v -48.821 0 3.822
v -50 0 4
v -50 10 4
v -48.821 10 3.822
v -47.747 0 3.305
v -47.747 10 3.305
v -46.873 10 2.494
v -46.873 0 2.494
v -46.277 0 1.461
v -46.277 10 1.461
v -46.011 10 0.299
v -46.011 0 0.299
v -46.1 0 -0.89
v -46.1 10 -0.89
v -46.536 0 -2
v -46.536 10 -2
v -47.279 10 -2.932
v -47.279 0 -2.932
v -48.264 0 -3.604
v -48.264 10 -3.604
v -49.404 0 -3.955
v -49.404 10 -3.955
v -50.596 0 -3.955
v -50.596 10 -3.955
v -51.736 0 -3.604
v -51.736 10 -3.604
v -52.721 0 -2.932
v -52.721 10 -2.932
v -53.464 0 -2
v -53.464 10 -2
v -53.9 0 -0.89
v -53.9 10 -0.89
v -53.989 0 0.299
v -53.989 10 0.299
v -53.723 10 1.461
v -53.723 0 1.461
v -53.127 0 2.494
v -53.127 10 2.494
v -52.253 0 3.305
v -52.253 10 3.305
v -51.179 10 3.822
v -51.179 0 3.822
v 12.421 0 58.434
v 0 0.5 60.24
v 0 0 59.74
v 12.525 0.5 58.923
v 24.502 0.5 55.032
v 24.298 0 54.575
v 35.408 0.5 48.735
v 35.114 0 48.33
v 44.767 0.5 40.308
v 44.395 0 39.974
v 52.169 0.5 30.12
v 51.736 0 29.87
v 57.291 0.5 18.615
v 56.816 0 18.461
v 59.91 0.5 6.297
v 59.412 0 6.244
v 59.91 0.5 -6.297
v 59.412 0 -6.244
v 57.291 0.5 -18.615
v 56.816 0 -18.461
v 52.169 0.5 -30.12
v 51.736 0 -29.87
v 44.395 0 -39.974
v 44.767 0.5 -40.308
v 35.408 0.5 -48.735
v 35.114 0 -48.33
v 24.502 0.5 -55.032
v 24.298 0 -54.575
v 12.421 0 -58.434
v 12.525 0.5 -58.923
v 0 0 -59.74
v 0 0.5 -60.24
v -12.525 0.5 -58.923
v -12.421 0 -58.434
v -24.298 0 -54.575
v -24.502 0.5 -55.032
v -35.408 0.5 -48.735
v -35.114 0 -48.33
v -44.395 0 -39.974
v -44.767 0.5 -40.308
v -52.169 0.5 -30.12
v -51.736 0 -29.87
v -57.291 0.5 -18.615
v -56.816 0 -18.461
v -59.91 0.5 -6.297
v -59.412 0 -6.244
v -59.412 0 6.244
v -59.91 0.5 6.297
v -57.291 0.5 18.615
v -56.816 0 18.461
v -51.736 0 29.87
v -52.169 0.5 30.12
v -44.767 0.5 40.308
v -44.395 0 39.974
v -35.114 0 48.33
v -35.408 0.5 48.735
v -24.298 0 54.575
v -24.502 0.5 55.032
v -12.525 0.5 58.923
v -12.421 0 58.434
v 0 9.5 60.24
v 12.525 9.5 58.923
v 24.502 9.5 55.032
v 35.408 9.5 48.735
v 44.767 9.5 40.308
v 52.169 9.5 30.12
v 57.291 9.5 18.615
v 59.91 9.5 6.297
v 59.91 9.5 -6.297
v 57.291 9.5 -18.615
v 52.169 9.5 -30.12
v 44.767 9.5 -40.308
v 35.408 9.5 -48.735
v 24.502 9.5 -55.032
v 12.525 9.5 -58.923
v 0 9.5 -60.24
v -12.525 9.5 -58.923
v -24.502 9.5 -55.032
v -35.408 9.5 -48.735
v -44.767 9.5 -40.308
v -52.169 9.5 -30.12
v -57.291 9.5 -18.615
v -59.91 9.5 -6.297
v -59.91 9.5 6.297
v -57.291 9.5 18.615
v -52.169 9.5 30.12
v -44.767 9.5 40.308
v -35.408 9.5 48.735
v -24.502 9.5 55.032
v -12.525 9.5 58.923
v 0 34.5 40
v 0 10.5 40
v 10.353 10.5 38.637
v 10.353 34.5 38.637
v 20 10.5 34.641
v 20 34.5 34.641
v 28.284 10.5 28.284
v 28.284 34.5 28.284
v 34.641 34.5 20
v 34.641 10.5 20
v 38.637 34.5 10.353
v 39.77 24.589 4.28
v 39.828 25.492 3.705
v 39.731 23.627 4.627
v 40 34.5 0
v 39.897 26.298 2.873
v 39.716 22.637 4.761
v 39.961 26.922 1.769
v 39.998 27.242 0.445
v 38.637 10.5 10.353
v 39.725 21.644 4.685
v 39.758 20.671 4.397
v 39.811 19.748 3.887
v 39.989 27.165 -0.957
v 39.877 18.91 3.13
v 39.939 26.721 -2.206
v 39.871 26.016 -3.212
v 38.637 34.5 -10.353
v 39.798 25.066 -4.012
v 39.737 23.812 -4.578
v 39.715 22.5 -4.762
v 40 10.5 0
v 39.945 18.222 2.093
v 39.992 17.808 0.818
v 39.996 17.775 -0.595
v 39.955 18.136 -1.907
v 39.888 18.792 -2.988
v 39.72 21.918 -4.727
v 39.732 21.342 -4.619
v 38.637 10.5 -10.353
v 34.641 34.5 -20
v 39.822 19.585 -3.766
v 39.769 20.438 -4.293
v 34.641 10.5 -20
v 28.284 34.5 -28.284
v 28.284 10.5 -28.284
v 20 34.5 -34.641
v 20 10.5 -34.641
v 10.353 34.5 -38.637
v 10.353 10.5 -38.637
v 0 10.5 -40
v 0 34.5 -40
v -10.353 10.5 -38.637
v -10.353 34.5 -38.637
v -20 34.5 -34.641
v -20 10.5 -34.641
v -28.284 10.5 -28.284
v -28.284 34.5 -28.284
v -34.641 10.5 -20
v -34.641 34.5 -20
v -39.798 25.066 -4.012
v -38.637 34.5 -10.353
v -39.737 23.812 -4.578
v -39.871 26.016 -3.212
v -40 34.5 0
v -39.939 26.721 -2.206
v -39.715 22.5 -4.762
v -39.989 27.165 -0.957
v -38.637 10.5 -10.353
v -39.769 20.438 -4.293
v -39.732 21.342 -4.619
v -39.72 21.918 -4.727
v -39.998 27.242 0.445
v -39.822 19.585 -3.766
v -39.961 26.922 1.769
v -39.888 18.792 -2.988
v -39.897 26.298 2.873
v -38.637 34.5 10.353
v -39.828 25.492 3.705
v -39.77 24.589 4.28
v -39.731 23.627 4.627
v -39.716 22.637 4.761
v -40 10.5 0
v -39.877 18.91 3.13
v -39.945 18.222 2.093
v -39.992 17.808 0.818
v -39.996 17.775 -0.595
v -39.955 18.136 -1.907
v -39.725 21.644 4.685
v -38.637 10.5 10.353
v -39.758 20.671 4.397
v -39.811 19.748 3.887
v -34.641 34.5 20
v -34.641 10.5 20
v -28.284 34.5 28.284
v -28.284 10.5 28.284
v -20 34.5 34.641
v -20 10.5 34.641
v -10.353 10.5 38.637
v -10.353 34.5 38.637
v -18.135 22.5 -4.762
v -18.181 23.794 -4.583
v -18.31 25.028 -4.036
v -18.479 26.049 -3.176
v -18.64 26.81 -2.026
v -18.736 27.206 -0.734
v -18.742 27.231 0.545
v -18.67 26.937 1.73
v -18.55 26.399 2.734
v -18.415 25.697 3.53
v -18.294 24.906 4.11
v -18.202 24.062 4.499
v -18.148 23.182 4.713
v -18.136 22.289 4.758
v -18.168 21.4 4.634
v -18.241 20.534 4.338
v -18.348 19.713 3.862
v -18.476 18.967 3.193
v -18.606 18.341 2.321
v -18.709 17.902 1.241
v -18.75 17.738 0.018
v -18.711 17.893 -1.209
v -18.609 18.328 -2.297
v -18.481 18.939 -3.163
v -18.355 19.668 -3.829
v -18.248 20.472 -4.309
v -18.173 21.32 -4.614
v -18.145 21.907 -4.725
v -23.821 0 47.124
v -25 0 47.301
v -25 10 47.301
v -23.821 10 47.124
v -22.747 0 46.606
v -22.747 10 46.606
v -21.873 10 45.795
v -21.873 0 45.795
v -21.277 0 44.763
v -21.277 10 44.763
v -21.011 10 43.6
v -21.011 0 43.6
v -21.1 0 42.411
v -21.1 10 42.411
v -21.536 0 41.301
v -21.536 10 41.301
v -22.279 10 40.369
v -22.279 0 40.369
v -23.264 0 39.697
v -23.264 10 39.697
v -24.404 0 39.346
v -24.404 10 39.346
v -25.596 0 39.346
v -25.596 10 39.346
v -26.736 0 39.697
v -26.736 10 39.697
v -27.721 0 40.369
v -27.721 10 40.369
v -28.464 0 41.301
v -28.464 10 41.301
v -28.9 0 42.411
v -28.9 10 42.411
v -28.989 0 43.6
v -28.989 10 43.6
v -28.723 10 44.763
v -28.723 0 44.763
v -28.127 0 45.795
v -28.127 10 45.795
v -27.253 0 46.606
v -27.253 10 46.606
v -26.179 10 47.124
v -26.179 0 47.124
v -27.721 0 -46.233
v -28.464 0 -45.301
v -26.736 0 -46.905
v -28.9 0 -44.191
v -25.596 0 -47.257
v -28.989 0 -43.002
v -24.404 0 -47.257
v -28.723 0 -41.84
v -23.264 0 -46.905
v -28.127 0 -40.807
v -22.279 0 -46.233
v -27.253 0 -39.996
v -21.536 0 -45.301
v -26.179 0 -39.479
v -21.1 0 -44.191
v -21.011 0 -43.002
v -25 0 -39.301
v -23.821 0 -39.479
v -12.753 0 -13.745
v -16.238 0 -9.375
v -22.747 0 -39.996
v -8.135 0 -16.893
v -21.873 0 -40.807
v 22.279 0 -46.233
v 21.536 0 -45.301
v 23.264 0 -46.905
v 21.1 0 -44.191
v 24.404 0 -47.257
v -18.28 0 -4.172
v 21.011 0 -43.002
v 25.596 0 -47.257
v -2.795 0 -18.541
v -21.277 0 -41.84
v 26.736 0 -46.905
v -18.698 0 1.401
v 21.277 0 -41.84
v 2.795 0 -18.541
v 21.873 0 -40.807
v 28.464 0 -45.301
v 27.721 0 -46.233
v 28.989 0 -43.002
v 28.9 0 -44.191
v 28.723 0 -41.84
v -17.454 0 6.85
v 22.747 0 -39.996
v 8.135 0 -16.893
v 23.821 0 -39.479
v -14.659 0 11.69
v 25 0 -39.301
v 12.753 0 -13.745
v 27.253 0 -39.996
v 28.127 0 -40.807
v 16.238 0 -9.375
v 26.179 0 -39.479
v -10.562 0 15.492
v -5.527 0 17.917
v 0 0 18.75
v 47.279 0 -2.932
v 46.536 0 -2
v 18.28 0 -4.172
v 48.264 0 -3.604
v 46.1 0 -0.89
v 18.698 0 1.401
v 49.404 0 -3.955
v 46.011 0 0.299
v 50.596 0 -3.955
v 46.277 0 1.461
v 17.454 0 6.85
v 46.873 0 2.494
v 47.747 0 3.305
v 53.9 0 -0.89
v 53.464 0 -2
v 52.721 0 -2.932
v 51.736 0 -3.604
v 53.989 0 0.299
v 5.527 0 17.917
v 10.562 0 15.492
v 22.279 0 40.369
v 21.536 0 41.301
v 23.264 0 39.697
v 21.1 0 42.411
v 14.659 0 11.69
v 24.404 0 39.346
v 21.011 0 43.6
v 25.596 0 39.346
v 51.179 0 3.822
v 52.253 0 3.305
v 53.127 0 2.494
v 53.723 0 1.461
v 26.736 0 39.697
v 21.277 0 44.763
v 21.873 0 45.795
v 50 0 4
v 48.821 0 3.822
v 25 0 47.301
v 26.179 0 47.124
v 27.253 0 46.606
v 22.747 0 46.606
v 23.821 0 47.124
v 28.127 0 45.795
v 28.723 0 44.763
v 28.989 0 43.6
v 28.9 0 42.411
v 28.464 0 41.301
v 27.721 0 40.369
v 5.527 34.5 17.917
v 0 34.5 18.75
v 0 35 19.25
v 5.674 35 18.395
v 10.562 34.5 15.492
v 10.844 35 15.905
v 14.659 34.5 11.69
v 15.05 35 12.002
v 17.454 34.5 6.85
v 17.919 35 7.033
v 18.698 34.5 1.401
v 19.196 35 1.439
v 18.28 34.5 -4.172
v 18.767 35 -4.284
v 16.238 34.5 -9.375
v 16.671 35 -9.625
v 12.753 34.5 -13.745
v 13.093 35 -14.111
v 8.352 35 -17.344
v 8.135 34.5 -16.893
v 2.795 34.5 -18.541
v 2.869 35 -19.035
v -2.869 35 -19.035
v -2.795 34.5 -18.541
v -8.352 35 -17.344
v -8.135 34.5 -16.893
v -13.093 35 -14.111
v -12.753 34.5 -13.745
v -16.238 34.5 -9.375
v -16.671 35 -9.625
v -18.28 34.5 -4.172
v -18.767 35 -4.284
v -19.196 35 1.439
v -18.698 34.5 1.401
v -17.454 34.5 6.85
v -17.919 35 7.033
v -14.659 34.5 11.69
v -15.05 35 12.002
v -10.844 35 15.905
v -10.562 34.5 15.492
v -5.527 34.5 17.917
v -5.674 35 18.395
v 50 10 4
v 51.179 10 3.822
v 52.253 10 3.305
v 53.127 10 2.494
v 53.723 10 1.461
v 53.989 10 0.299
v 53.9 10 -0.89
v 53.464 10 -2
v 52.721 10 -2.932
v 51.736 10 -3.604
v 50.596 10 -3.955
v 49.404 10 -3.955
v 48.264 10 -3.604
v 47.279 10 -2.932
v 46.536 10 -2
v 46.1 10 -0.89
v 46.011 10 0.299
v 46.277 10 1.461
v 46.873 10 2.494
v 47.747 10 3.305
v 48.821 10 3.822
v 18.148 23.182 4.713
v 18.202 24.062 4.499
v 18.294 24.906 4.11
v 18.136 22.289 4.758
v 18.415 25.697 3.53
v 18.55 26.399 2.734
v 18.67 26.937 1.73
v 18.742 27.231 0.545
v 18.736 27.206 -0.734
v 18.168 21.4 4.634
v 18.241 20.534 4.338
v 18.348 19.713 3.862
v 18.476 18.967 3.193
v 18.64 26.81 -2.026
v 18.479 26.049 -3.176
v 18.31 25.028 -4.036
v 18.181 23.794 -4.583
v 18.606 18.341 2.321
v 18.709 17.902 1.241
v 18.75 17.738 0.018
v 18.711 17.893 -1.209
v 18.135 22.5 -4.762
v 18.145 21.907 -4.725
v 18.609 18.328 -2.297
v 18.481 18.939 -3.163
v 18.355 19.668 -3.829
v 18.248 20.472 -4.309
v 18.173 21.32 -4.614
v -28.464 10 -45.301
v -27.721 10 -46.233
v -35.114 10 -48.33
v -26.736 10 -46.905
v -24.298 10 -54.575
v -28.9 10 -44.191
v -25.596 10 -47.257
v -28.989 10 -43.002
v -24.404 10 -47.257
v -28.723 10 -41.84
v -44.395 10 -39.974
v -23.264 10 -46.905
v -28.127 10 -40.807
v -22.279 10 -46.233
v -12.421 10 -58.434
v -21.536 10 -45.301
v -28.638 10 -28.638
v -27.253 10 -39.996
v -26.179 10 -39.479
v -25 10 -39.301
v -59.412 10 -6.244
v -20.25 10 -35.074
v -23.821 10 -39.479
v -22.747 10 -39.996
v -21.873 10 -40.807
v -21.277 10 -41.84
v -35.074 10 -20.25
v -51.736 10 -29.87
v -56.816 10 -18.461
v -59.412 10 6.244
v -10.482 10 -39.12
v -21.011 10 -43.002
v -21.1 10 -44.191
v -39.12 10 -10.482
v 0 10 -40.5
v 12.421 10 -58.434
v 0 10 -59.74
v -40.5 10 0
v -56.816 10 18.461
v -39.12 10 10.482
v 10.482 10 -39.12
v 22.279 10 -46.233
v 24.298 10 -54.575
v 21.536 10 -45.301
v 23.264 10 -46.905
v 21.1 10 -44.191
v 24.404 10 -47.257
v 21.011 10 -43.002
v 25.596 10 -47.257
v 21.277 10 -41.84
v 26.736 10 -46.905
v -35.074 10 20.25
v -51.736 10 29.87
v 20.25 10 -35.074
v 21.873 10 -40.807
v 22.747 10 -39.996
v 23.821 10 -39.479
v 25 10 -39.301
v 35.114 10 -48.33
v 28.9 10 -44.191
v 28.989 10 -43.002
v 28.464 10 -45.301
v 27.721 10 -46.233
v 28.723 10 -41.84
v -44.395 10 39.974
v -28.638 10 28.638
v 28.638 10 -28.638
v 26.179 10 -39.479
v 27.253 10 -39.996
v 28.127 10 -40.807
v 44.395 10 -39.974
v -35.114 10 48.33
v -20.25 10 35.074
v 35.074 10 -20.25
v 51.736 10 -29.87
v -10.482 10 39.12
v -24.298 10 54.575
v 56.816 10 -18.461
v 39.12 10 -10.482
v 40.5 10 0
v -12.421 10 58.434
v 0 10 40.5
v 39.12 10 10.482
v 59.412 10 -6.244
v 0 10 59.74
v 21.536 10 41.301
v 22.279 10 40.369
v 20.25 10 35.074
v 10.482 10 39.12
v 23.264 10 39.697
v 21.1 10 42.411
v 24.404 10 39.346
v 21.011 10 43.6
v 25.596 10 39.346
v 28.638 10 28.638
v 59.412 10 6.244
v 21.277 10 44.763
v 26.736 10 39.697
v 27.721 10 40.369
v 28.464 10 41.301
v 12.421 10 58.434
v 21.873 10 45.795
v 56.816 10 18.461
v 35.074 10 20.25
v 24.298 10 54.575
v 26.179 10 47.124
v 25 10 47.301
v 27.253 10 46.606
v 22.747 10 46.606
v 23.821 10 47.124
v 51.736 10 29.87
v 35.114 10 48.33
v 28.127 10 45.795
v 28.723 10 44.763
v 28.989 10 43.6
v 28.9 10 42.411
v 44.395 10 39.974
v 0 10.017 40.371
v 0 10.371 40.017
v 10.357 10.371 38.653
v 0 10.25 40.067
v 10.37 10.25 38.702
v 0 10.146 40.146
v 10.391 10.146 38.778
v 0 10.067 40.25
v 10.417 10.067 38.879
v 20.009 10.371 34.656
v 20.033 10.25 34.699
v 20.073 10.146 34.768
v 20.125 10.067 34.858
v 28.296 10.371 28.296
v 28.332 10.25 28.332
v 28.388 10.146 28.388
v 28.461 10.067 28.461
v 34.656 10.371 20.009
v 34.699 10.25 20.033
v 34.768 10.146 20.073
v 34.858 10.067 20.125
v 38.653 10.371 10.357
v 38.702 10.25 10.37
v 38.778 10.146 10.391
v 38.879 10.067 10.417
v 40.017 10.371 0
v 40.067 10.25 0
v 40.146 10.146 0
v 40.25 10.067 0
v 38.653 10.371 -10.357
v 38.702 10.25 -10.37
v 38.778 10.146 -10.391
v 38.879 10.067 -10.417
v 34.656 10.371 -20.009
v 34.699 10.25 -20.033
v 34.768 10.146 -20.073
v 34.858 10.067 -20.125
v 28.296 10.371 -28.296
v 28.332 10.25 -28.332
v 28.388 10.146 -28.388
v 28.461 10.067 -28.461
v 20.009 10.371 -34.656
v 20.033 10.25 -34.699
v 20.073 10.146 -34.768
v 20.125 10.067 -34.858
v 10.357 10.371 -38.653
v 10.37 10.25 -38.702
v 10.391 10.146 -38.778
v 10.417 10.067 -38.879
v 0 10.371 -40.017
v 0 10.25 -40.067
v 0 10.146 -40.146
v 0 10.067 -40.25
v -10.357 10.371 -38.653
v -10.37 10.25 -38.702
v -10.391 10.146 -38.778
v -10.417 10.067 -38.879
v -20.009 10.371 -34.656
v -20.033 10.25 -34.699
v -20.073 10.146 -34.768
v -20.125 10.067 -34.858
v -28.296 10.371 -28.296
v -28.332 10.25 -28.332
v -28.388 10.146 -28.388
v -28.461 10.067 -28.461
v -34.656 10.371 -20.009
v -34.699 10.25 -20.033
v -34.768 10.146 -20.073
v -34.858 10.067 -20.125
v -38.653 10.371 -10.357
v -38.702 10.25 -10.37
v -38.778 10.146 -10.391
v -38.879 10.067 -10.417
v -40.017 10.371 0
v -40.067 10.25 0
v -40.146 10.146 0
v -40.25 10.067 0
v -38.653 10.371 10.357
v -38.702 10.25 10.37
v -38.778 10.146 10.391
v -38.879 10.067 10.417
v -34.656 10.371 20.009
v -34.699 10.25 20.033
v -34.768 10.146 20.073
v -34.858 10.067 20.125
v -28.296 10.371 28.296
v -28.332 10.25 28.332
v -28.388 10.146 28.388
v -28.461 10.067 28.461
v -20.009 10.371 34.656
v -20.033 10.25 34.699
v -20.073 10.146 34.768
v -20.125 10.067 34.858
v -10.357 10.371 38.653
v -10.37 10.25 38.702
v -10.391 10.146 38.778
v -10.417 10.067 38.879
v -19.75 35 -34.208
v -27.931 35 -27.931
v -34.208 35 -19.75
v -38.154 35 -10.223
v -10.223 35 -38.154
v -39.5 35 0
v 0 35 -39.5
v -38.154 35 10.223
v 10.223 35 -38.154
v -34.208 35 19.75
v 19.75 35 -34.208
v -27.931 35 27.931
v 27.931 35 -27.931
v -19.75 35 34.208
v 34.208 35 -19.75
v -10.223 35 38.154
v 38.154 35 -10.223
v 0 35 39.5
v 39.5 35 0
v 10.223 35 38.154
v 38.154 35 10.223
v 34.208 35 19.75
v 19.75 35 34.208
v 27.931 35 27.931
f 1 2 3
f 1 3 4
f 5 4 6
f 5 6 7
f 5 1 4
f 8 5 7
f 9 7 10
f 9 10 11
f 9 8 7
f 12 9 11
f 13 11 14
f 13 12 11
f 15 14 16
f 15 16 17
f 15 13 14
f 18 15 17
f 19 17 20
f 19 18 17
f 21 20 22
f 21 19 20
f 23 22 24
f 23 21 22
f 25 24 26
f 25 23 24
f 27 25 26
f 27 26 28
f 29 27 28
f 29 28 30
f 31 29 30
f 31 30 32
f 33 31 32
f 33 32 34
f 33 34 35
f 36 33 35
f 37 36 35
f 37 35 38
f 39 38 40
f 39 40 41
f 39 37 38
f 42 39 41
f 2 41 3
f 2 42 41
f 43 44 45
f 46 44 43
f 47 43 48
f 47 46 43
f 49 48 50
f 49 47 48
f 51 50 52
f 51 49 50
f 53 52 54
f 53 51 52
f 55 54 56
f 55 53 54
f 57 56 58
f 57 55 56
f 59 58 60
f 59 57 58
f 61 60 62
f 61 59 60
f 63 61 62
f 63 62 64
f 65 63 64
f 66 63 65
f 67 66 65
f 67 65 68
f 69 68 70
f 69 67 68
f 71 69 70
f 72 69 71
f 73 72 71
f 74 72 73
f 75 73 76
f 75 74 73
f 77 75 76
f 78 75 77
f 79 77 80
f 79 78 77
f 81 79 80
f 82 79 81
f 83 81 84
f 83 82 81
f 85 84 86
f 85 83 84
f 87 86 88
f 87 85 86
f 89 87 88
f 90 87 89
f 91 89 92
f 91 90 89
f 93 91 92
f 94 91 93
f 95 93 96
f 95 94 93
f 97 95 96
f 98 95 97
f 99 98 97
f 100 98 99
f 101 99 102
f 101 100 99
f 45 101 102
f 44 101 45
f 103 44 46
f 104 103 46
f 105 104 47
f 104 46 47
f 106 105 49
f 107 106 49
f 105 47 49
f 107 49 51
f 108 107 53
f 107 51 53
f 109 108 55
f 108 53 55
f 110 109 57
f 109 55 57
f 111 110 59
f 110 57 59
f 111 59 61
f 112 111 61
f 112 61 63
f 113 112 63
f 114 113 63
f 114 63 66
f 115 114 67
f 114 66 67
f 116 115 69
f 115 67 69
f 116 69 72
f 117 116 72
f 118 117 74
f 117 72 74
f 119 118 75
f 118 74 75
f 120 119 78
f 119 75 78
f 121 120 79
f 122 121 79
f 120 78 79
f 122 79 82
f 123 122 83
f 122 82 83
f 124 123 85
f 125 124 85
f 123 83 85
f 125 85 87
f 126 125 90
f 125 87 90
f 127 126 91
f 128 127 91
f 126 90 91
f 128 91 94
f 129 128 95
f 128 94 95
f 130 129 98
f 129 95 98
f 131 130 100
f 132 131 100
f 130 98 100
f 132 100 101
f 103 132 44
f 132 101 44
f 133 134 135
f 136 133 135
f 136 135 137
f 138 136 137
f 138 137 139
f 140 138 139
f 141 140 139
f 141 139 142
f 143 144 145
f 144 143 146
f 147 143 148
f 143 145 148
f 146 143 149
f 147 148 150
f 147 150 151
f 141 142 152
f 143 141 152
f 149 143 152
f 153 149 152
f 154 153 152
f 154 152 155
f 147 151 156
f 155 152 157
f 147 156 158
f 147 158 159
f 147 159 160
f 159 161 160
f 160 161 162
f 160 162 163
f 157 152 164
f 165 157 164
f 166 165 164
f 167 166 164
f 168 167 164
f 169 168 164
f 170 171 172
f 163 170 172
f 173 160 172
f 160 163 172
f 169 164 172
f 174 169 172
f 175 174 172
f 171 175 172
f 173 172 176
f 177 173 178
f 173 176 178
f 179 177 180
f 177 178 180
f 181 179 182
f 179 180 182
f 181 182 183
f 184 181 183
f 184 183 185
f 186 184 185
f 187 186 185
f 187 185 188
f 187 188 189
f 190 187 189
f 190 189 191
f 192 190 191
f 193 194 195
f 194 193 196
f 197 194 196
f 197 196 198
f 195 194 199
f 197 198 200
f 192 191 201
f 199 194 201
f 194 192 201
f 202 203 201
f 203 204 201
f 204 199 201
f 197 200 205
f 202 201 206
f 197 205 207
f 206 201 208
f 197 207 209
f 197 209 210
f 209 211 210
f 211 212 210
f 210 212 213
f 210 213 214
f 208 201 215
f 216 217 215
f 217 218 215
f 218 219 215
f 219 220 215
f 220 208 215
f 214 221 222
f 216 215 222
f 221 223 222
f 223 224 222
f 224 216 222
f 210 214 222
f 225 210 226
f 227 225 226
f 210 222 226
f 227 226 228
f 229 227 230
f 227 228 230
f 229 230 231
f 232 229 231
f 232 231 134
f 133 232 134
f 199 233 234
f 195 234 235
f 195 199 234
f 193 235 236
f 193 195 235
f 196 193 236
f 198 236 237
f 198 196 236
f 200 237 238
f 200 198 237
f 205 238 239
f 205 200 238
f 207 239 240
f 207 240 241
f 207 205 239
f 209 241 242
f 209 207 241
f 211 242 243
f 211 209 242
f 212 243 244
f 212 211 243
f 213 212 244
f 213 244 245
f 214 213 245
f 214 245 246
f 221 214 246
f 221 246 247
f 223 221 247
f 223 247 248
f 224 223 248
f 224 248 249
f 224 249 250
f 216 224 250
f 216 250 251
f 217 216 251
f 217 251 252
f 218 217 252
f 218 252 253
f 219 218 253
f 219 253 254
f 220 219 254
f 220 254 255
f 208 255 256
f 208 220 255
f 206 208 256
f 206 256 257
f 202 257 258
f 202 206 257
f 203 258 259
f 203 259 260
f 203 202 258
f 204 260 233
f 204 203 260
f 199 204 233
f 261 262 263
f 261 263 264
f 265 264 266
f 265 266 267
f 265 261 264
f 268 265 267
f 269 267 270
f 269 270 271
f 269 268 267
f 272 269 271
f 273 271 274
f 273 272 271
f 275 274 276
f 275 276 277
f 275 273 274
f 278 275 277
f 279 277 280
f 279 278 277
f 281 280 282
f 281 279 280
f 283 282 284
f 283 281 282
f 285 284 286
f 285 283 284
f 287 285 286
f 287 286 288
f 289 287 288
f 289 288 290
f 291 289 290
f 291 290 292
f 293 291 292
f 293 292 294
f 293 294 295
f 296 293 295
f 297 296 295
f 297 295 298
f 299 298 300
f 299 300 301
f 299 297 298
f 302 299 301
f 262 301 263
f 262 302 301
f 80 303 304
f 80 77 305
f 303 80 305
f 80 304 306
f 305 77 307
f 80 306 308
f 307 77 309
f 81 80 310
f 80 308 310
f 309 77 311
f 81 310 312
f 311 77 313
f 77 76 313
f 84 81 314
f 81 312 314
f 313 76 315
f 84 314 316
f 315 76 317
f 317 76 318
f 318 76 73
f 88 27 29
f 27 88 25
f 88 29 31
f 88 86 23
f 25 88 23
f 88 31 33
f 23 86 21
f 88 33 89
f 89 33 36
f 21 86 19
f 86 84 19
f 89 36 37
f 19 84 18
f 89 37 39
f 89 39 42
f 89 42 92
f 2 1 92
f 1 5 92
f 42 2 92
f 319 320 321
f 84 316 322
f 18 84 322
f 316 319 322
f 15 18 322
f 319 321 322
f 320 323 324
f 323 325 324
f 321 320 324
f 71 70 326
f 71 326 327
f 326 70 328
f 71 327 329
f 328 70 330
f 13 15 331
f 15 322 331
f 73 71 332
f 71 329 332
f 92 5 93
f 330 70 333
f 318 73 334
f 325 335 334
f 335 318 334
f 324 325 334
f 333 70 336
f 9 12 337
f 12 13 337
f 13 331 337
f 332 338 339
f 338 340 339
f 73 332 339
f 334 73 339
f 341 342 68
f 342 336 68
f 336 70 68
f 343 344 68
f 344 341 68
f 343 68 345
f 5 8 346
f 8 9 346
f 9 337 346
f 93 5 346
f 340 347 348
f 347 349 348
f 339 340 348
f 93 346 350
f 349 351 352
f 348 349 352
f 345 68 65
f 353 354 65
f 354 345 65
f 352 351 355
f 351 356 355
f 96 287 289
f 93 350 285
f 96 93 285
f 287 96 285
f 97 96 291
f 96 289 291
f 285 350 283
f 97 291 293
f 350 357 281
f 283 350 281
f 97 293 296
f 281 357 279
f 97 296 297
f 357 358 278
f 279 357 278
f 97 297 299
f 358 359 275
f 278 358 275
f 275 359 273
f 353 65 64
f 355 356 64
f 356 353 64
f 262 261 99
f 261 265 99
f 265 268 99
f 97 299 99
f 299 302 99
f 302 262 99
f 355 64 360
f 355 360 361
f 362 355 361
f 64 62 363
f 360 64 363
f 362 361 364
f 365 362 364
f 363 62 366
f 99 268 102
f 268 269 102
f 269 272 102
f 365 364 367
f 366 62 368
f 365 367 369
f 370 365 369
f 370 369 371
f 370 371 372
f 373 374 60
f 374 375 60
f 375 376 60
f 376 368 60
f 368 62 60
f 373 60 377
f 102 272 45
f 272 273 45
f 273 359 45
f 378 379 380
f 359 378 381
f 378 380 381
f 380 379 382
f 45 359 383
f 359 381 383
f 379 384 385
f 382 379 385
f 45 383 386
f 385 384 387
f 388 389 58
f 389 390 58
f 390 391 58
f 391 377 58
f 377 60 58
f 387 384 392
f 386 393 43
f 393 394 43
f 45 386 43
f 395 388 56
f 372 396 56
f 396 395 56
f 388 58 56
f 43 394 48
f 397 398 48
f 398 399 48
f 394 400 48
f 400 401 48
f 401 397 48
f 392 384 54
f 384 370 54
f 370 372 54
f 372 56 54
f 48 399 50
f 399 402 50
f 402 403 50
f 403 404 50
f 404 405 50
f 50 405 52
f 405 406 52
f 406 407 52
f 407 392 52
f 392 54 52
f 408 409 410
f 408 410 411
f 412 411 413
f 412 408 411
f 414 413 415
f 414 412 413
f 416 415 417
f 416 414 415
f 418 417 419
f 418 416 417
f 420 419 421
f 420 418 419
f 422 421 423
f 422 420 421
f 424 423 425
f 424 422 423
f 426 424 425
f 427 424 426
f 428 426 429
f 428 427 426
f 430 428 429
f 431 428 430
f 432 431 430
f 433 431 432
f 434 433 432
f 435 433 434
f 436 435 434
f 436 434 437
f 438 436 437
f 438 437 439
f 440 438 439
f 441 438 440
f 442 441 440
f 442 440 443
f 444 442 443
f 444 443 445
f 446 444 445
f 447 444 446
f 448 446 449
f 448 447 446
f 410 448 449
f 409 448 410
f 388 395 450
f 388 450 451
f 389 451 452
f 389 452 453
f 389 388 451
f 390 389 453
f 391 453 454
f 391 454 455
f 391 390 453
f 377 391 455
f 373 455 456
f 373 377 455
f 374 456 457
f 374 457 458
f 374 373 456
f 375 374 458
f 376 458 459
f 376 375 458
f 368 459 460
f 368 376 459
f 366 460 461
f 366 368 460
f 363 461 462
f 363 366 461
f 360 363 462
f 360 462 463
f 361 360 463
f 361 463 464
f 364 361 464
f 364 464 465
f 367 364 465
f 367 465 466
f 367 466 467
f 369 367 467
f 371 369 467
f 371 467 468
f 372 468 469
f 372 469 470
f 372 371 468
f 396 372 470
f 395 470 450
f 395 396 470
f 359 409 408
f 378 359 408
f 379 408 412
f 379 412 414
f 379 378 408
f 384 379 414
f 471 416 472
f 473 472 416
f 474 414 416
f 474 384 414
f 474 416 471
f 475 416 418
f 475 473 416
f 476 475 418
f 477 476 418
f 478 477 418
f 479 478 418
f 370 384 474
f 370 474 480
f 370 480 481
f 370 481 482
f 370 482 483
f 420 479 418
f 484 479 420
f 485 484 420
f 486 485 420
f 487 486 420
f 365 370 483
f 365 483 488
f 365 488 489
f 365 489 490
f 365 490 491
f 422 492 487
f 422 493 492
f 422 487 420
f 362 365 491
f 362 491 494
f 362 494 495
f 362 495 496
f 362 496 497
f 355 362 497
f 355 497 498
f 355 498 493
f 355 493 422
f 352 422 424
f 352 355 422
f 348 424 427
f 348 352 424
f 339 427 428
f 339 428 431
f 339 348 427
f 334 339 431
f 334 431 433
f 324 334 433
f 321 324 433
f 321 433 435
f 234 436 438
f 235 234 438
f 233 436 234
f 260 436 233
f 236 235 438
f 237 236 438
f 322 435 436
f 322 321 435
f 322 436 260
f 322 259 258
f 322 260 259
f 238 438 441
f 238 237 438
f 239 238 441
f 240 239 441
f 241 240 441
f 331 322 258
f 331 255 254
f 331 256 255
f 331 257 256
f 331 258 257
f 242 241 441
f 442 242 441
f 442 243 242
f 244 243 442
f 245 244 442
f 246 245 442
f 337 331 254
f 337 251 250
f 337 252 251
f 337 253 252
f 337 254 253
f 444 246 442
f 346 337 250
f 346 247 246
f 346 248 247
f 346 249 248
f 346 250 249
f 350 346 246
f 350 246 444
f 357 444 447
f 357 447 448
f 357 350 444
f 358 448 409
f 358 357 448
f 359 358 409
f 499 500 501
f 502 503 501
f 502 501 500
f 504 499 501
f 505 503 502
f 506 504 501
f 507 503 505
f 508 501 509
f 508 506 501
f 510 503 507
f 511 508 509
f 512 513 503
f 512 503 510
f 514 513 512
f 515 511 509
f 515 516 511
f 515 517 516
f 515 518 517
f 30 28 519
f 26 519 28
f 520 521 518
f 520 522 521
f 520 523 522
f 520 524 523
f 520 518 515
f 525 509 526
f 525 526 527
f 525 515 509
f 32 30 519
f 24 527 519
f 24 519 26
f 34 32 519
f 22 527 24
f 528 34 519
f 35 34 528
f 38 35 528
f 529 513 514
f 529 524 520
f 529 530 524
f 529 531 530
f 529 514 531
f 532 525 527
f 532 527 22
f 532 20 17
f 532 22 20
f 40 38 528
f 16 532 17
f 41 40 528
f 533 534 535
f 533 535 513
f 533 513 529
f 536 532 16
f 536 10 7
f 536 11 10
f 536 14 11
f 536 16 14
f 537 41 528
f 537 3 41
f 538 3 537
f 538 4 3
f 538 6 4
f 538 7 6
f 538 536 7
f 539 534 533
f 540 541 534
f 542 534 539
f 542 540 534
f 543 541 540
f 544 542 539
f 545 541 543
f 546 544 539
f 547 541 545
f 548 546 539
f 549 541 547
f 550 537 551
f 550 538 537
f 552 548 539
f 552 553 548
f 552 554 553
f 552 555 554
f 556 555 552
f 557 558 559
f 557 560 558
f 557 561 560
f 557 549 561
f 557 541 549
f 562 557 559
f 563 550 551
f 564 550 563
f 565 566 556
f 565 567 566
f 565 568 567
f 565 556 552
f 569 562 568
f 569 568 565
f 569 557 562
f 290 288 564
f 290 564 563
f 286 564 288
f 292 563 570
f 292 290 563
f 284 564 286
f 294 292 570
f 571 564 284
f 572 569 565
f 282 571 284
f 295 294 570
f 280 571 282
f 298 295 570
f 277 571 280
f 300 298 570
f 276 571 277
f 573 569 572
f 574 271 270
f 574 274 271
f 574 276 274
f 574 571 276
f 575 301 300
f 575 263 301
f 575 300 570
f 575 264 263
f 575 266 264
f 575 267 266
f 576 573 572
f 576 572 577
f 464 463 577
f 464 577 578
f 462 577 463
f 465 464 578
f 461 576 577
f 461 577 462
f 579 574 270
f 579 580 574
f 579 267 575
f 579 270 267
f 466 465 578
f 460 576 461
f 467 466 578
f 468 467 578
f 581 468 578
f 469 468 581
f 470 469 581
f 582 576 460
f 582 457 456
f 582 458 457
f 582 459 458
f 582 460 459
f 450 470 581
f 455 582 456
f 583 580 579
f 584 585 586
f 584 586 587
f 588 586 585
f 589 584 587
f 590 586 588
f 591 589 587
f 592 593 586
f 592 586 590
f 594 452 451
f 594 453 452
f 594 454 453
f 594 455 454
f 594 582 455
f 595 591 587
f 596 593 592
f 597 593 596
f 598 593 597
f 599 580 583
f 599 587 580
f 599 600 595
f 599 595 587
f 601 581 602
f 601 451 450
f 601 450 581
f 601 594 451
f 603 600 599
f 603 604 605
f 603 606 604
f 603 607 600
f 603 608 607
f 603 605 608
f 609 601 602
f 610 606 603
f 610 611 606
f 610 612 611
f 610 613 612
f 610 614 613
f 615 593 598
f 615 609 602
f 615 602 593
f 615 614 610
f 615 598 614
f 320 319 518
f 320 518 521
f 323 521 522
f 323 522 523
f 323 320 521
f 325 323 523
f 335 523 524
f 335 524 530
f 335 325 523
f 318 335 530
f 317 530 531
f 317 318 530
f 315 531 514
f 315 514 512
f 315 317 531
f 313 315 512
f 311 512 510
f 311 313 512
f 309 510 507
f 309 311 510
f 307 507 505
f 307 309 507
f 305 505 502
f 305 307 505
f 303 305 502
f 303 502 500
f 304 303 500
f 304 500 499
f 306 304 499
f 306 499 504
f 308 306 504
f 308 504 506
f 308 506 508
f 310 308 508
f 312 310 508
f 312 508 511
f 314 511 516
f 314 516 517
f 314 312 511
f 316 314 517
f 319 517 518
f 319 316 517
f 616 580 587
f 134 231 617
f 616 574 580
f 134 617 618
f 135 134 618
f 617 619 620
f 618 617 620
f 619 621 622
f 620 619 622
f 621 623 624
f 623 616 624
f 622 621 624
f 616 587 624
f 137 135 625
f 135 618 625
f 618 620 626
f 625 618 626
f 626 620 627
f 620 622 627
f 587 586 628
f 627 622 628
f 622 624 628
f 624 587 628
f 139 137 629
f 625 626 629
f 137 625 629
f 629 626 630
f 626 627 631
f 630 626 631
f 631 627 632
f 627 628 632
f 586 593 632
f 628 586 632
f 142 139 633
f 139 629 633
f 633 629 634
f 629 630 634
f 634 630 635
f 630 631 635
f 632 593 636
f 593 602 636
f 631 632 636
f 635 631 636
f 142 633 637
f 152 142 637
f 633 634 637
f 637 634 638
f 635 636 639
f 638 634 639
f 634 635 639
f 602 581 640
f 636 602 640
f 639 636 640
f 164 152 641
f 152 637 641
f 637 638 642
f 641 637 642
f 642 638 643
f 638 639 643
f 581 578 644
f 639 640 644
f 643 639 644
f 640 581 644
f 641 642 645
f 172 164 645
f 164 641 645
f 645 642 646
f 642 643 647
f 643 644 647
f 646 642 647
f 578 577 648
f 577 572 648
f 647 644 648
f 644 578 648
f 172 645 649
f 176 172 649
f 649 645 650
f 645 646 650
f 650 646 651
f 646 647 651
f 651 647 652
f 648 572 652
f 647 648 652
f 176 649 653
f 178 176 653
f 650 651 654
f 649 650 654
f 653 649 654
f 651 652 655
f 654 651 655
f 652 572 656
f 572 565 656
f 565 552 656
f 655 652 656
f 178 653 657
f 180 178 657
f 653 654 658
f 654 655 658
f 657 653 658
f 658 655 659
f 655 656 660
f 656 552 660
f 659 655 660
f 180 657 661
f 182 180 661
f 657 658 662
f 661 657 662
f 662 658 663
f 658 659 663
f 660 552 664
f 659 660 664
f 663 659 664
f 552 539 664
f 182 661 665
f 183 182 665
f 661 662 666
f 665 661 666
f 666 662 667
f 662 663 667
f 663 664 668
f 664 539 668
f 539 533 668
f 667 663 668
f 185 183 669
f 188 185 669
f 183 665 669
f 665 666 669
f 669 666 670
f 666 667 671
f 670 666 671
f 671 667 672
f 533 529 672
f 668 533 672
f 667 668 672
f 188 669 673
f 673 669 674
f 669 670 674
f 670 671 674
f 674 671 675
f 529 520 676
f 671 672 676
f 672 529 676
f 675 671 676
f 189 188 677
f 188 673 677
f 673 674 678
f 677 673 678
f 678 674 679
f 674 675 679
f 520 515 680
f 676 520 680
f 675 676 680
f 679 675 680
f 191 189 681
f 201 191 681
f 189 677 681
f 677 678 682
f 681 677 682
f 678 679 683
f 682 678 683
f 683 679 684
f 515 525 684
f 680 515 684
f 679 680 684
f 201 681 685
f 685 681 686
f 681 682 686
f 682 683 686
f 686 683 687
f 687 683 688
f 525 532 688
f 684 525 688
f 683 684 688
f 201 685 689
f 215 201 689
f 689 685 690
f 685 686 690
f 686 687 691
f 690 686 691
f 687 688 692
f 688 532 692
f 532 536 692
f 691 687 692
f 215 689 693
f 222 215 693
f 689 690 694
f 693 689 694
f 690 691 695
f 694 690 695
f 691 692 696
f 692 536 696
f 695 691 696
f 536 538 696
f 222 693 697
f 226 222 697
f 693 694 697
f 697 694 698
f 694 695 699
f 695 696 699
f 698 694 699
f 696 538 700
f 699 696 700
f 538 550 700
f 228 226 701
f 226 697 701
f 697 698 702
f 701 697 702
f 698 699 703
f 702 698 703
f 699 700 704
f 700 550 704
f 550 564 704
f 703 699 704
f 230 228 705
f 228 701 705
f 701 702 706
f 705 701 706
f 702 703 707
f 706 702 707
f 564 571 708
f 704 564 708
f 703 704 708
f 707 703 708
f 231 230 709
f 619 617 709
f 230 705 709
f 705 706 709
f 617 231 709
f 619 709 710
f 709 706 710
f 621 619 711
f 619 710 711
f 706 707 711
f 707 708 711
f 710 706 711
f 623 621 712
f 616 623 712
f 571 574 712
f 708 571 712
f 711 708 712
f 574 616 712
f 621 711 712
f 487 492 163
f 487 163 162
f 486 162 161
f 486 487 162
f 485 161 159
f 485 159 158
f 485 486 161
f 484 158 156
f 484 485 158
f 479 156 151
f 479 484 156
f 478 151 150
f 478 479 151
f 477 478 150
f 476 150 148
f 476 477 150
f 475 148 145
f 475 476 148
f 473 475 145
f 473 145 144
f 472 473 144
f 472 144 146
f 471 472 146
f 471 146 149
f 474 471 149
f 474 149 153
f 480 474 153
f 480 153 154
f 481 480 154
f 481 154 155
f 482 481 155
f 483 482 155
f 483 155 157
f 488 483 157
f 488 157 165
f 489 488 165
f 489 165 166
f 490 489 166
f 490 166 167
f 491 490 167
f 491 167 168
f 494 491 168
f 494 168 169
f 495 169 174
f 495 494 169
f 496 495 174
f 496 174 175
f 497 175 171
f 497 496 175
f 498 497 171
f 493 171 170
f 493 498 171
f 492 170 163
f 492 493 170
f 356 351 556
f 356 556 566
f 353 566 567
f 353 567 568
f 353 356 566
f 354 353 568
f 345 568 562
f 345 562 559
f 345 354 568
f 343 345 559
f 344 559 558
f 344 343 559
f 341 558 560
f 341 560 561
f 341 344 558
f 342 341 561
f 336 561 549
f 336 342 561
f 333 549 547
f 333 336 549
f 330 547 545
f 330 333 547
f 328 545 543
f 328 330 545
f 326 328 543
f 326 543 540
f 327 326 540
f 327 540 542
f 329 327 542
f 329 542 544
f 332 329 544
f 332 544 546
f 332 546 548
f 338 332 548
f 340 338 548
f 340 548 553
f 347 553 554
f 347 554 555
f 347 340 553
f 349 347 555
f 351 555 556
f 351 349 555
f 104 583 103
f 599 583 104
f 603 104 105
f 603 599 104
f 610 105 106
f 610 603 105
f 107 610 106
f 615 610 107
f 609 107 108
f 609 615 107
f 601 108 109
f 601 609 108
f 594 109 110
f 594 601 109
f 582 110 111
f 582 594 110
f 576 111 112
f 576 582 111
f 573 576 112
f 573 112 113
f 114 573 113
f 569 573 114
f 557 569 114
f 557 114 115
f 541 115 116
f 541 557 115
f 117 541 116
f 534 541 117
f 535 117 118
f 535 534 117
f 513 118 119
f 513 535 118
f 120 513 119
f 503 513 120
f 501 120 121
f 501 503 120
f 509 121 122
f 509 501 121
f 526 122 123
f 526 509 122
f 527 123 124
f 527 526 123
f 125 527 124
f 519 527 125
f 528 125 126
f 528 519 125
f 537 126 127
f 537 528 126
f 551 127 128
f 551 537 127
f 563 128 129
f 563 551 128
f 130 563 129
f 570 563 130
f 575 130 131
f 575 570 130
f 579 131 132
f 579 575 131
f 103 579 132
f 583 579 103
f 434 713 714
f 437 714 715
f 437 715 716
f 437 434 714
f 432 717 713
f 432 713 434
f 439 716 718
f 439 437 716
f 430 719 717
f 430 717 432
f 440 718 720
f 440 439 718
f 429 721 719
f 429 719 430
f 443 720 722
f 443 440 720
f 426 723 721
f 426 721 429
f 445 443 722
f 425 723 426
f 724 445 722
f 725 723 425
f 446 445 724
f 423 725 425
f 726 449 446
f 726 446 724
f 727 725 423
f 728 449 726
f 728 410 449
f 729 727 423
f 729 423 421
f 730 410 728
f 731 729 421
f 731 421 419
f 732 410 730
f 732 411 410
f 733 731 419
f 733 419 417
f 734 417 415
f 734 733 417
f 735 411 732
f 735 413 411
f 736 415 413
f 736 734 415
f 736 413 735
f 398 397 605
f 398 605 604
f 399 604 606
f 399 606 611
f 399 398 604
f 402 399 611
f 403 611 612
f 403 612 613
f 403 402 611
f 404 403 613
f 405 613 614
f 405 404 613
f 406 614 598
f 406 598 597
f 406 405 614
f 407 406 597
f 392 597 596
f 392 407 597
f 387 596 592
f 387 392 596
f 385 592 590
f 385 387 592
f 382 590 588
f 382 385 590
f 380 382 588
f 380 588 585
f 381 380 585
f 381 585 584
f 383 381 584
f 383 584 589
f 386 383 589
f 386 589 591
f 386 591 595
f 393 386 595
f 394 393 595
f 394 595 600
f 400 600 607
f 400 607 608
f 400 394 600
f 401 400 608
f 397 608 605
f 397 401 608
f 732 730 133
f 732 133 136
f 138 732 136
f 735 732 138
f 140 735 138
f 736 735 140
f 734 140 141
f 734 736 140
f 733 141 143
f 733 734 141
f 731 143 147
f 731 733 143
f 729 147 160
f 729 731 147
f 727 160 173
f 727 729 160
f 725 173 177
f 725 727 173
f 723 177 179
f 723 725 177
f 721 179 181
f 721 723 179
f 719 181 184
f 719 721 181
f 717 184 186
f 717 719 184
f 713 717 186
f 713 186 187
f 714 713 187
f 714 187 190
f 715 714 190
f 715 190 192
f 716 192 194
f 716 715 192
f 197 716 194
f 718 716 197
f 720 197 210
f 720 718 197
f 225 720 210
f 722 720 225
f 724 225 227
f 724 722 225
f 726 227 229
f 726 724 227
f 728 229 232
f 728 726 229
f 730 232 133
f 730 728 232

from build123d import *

# Parameters (mm, degrees)
CROQUIS1_R                 = 60.239614391
CROQUIS1_R_2               = 18.75
CROQUIS1_R_3               = 4
SALIENTE_EXTRUIR1_DEPTH    = 10
CROQUIS2_R                 = 40
CROQUIS2_R_2               = 18.75
SALIENTE_EXTRUIR2_DEPTH    = 25
CHAFL_N2_SIZE              = 0.5
REDONDEO1_R                = 0.5
CORTAR_EXTRUIR1_DEPTH      = 93.101152457
CORTAR_EXTRUIR1_DEPTH_BACK = 93.101152457
CROQUIS3_R                 = 4.7625


with BuildPart() as part:
    # Croquis1 → Saliente-Extruir1 (new body)
    with BuildSketch(Plane(origin=(0, 0, 0), x_dir=(1, 0, 0), z_dir=(0, 1, 0))):
        with Locations(Location((0, 0, 0), (0, 0, 270))):
            Circle(CROQUIS1_R)
        with Locations(Location((0, 0, 0), (0, 0, 270))):
            Circle(CROQUIS1_R_2, mode=Mode.SUBTRACT)
        with Locations(Location((25, -43.301270189, 0), (0, 0, 270))):
            Circle(CROQUIS1_R_3, mode=Mode.SUBTRACT)
        with Locations(Location((-25, -43.301270189, 0), (0, 0, 270))):
            Circle(CROQUIS1_R_3, mode=Mode.SUBTRACT)
        with Locations(Location((-50, 0, 0), (0, 0, 270))):
            Circle(CROQUIS1_R_3, mode=Mode.SUBTRACT)
        with Locations(Location((-25, 43.301270189, 0), (0, 0, 270))):
            Circle(CROQUIS1_R_3, mode=Mode.SUBTRACT)
        with Locations(Location((25, 43.301270189, 0), (0, 0, 270))):
            Circle(CROQUIS1_R_3, mode=Mode.SUBTRACT)
        with Locations(Location((50, 0, 0), (0, 0, 270))):
            Circle(CROQUIS1_R_3, mode=Mode.SUBTRACT)
    extrude(amount=SALIENTE_EXTRUIR1_DEPTH)

    # Croquis2 → Saliente-Extruir2 (add)
    with BuildSketch(Plane(origin=(0, 10, 0), x_dir=(1, 0, 0), z_dir=(0, 1, 0))):
        with Locations(Location((0, 0, 0), (0, 0, 270))):
            Circle(CROQUIS2_R)
        with Locations(Location((0, 0, 0), (0, 0, 270))):
            Circle(CROQUIS2_R_2, mode=Mode.SUBTRACT)
    extrude(amount=SALIENTE_EXTRUIR2_DEPTH)

    # Chaflán2
    chafl_n2_edges = [part.edges().sort_by_distance(p)[0] for p in [
        (0, 0, -60.239614391),
        (0, 35, -40),
        (0, 35, -18.75),
        (0, 10, -60.239614391),
    ]]
    chamfer(chafl_n2_edges, length=CHAFL_N2_SIZE)

    # Redondeo1
    redondeo1_edges = [part.edges().sort_by_distance(p)[0] for p in [
        (0, 10, -40),
    ]]
    fillet(redondeo1_edges, radius=REDONDEO1_R)

    # Croquis3 → Cortar-Extruir1 (cut, two sides: drawn at the far end of the back side and taken through both)
    with BuildSketch(Plane(origin=(0, 0, 0), x_dir=(0, 0, -1), z_dir=(1, 0, 0)).offset(-CORTAR_EXTRUIR1_DEPTH_BACK)):
        with Locations((0, 22.5)):
            Circle(CROQUIS3_R)
    extrude(amount=CORTAR_EXTRUIR1_DEPTH + CORTAR_EXTRUIR1_DEPTH_BACK, mode=Mode.SUBTRACT)


solid = part.part
